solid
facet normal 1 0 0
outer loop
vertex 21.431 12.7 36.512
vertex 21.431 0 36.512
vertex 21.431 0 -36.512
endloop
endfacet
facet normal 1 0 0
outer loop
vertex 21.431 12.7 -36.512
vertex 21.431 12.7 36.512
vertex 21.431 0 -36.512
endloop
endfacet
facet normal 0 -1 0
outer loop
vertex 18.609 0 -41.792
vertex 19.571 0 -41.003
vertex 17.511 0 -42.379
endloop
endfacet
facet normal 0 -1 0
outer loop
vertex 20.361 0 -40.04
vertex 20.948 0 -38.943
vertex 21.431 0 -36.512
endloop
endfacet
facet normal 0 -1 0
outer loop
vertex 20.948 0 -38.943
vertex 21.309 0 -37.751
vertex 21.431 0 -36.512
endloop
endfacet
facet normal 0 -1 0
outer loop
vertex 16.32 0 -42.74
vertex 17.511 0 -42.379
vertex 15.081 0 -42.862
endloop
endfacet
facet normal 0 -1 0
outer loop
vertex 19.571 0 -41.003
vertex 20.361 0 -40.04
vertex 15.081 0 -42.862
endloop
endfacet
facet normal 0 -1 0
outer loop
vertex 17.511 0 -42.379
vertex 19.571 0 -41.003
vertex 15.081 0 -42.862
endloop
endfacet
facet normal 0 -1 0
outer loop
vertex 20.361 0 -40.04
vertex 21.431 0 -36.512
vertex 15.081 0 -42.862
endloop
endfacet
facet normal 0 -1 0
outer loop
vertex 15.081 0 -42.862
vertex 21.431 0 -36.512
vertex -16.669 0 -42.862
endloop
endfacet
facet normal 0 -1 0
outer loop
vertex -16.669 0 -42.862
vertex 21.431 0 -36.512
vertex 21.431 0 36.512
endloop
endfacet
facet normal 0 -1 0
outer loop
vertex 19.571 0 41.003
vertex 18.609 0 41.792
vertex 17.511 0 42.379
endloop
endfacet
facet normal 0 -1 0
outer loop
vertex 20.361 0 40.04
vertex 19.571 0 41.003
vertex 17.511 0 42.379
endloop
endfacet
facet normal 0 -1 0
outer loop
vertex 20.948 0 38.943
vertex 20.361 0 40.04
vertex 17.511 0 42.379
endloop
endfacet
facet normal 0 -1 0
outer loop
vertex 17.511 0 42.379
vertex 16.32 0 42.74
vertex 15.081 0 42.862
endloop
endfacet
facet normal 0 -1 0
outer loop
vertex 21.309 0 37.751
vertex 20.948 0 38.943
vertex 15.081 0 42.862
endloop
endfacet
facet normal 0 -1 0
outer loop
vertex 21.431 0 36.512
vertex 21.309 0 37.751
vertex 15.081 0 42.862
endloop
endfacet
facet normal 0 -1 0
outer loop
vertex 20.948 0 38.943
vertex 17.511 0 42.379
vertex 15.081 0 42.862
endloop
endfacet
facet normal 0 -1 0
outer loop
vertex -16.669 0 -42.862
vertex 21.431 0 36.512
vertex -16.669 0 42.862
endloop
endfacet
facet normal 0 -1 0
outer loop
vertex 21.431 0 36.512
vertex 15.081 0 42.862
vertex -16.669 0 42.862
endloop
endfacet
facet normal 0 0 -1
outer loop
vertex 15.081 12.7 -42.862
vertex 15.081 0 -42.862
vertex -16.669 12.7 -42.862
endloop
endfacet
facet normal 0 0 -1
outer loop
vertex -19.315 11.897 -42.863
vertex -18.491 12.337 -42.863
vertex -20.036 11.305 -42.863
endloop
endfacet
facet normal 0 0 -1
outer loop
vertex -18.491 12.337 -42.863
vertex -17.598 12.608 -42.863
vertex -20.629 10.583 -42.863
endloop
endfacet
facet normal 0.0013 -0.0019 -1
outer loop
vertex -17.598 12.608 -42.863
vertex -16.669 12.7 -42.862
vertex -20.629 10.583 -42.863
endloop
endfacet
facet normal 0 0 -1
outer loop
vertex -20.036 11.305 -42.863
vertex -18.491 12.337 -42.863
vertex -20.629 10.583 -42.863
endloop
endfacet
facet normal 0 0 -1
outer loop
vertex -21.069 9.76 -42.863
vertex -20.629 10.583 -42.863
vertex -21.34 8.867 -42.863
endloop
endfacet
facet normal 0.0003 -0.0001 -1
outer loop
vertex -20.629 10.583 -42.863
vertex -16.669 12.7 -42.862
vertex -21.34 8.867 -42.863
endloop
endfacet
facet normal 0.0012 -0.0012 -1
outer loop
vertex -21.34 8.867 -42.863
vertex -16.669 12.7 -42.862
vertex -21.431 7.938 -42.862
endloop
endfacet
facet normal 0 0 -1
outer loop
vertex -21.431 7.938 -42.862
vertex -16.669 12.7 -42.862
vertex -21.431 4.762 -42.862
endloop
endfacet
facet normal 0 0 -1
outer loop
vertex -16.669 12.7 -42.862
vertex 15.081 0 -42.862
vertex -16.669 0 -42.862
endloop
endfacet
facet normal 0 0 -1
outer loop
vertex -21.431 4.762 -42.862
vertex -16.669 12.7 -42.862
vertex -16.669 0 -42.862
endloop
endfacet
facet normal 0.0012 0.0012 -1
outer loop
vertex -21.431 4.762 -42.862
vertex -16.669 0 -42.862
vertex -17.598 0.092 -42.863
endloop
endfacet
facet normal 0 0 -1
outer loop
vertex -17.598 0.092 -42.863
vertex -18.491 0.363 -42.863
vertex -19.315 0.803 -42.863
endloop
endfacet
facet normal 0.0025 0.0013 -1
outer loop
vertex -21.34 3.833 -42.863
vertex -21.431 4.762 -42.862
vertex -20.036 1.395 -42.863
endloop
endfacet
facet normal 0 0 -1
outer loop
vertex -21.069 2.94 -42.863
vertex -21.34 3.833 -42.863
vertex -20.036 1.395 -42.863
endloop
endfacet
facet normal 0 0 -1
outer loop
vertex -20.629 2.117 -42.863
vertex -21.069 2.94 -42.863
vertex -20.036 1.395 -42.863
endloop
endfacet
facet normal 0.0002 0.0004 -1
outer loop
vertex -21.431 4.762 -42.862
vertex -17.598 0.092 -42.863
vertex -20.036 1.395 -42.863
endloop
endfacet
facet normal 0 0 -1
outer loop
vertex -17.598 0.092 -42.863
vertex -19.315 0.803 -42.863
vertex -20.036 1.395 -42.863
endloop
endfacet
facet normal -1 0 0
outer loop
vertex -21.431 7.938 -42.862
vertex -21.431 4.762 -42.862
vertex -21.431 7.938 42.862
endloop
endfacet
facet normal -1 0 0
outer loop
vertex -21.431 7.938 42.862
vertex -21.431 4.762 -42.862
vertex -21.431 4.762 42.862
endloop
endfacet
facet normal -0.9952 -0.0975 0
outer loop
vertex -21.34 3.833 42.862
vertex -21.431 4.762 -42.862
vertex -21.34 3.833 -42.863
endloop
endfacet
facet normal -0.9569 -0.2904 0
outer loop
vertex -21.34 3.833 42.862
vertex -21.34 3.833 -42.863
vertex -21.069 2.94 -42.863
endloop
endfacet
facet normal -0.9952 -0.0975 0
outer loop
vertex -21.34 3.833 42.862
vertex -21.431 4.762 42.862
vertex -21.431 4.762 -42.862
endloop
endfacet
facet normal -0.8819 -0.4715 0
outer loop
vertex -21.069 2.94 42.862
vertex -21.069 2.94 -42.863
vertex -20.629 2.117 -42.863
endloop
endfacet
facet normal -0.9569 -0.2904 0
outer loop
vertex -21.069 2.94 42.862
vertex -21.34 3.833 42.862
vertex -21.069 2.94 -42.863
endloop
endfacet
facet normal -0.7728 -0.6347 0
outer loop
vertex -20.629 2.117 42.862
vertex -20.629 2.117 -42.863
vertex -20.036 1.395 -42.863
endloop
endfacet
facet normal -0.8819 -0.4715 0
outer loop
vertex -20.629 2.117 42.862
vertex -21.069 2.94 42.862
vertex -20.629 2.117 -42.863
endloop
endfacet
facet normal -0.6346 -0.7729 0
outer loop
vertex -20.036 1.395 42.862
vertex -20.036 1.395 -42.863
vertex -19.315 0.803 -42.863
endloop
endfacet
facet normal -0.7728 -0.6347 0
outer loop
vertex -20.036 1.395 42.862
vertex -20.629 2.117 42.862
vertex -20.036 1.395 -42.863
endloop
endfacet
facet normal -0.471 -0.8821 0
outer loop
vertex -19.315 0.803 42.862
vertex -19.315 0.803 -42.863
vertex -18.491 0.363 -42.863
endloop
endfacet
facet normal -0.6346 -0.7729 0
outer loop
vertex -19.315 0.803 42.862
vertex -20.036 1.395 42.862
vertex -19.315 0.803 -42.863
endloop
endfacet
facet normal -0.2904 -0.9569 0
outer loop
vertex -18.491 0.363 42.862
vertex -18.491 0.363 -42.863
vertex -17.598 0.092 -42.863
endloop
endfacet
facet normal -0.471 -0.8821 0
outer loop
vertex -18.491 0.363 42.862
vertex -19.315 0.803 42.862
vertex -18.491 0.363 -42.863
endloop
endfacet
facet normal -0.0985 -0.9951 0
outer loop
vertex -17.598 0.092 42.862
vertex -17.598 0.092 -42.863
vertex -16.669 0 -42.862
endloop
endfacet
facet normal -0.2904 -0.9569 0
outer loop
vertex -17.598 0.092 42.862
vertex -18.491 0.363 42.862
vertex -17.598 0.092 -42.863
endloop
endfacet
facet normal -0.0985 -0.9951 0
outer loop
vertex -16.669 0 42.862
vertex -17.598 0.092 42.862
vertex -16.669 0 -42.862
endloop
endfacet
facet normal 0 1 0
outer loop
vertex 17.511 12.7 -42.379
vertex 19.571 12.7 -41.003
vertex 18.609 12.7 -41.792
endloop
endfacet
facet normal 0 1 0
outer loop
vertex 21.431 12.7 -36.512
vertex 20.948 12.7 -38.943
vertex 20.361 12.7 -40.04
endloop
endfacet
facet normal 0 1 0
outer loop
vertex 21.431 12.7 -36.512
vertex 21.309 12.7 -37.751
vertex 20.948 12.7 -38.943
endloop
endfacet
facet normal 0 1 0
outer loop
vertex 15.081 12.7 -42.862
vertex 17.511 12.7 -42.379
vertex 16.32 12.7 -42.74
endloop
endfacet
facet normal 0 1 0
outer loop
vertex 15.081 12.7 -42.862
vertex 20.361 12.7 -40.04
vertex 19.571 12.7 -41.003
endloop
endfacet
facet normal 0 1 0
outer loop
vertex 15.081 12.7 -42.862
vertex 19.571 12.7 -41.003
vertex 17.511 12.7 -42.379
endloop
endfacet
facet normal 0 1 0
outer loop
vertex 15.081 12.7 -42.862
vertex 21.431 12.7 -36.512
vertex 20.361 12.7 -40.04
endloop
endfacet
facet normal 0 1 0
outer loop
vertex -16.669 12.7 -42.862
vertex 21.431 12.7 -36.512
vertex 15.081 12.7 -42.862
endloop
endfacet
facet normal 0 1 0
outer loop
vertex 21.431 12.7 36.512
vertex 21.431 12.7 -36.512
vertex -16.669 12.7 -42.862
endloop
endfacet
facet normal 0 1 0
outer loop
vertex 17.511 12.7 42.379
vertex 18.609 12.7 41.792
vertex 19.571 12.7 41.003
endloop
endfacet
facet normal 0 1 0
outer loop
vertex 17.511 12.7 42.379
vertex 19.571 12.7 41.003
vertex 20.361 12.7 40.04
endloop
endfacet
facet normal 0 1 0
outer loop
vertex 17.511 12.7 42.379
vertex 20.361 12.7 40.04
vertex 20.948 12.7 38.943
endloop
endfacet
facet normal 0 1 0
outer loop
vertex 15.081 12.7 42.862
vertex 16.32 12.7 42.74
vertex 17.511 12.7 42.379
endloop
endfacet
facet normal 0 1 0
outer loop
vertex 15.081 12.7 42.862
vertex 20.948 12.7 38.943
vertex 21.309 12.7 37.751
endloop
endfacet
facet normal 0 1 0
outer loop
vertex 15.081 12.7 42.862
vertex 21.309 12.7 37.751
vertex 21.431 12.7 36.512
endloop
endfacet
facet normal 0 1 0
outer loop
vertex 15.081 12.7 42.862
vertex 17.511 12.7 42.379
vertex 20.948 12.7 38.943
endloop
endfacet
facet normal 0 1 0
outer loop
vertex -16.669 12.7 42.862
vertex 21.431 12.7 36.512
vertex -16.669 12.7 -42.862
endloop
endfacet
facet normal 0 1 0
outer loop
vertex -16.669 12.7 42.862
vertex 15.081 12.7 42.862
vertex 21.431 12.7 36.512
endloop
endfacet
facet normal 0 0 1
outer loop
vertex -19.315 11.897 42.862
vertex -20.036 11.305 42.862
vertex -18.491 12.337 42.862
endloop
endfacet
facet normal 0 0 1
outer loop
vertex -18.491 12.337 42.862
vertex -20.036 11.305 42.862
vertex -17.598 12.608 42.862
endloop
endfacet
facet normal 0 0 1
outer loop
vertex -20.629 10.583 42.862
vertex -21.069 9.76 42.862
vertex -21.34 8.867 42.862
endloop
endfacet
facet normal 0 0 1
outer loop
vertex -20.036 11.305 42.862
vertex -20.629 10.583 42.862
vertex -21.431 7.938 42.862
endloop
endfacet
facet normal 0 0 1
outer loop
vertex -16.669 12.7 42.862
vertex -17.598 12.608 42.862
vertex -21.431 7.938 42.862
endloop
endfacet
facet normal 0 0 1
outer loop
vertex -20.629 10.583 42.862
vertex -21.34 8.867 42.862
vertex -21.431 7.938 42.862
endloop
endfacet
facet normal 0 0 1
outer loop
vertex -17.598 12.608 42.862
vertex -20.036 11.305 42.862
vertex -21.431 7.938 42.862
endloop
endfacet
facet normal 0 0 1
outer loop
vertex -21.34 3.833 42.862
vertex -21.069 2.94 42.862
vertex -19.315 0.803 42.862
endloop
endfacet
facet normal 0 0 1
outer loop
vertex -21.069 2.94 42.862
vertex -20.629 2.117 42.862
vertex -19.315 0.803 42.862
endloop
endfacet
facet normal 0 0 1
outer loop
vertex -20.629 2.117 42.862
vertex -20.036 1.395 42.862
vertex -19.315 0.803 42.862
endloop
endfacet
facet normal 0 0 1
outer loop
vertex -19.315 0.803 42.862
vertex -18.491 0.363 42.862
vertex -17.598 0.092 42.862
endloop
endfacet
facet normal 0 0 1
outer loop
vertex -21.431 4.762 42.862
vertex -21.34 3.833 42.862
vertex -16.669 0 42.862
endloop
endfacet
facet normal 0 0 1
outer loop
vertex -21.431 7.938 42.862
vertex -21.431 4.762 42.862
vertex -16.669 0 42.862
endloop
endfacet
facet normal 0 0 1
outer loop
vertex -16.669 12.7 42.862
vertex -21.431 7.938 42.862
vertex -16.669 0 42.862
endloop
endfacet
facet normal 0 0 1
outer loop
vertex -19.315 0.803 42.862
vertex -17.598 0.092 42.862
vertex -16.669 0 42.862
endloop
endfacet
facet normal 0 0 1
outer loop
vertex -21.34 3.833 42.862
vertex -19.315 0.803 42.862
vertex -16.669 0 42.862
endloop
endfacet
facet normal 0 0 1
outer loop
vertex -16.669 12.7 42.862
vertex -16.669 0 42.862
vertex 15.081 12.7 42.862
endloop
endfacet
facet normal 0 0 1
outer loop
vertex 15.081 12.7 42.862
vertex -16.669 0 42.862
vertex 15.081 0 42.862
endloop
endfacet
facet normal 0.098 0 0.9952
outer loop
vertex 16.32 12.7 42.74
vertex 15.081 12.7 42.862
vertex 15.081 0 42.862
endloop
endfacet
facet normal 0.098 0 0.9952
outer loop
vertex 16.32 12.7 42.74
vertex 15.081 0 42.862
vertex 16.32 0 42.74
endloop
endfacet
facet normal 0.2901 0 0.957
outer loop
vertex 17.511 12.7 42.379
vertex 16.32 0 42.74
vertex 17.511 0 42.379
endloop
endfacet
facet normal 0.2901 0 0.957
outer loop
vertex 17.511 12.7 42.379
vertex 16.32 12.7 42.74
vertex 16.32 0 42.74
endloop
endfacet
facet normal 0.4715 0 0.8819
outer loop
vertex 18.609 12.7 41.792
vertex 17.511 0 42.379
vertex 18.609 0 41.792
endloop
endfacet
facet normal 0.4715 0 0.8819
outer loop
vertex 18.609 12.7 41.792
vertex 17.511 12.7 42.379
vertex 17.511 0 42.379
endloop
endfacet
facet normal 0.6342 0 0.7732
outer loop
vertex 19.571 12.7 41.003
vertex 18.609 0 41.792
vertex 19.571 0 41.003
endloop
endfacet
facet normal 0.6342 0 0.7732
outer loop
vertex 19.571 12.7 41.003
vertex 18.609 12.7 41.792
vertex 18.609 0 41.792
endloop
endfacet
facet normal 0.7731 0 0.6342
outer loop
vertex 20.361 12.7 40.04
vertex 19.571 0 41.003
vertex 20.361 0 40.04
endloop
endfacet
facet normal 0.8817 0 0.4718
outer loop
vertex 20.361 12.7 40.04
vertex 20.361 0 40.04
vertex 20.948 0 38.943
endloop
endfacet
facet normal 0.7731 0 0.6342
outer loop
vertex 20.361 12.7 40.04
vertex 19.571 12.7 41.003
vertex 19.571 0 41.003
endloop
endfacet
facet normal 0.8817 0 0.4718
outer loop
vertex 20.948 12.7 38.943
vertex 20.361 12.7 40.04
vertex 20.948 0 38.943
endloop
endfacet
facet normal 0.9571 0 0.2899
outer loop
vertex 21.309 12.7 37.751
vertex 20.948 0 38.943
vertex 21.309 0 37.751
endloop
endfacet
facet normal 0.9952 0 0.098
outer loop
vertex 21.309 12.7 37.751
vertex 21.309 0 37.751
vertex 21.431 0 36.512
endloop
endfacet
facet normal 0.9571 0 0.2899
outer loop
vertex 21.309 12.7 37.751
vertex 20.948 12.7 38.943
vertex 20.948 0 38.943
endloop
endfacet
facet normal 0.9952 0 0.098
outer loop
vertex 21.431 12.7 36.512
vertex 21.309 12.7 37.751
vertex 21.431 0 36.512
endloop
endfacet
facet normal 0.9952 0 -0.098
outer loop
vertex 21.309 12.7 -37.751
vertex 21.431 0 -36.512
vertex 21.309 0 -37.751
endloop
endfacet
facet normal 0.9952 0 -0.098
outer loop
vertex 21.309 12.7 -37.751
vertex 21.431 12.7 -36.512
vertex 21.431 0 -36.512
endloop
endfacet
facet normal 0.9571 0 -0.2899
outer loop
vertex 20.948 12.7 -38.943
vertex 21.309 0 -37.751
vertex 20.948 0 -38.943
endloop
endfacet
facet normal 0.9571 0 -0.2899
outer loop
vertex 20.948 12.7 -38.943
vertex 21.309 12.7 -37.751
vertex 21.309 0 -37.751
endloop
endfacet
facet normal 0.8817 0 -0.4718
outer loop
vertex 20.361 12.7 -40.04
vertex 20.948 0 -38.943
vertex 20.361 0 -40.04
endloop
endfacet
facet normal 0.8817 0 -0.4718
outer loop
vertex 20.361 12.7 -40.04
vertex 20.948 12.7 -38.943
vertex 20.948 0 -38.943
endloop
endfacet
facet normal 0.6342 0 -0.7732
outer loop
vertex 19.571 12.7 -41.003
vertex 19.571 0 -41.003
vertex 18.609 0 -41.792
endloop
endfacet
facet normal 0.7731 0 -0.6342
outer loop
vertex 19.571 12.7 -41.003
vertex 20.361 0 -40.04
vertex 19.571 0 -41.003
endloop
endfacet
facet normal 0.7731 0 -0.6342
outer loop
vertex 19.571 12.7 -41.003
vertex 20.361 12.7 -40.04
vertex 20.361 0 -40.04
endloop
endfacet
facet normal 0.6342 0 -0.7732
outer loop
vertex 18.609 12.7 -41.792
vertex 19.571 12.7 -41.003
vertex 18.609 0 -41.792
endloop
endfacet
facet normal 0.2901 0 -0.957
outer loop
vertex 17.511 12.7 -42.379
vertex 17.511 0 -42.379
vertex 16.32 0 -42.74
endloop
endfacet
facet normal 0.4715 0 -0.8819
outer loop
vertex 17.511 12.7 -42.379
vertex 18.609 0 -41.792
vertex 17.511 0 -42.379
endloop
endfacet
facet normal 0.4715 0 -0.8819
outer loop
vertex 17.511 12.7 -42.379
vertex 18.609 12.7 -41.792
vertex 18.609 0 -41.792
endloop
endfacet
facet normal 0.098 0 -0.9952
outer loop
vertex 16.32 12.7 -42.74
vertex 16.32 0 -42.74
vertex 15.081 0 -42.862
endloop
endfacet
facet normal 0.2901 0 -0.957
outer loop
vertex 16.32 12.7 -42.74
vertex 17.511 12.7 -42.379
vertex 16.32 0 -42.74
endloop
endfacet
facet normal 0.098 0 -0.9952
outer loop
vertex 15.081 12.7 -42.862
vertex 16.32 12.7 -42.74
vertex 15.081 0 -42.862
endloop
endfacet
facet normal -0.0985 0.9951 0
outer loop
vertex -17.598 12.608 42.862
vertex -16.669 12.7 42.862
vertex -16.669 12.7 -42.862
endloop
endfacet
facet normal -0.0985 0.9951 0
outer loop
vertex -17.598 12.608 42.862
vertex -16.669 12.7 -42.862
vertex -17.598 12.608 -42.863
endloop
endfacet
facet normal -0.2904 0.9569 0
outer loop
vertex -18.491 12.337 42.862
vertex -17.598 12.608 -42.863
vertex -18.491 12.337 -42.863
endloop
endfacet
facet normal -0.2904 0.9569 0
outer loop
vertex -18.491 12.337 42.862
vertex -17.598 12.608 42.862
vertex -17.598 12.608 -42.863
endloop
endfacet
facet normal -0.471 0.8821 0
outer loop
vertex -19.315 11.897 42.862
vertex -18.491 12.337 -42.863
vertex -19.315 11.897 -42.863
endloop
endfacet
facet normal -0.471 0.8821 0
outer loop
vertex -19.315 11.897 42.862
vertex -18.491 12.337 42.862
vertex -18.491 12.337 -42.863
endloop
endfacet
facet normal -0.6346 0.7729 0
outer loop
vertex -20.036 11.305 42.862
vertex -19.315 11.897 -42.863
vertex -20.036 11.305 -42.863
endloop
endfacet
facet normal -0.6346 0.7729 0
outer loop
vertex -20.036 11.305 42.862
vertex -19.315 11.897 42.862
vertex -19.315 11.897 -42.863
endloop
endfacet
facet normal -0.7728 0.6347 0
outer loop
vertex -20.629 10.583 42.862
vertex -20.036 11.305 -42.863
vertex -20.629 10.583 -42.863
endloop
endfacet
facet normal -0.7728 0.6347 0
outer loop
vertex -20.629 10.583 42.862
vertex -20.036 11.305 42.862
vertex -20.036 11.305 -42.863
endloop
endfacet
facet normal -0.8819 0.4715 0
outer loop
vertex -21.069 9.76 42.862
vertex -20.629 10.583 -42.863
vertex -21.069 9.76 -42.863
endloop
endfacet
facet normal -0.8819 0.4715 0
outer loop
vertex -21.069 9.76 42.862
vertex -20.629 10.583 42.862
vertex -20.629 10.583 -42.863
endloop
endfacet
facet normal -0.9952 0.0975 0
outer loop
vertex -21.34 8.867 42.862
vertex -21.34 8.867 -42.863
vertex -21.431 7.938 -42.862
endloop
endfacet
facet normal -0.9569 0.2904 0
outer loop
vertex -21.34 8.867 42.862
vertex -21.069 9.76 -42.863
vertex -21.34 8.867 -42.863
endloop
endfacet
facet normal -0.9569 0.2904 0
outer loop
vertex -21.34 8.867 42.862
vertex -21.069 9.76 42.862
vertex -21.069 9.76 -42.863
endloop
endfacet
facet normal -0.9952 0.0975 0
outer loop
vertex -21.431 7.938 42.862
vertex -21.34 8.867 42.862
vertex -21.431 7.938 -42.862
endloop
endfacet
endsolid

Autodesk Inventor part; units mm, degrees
ref_plane "YZ Plane" through (0, 0, 0) normal (1, 0, 0) x (0, 1, 0)
ref_plane "XZ Plane" through (0, 0, 0) normal (0, 1, 0) x (-1, 0, 0)
ref_plane "XY Plane" through (0, 0, 0) normal (0, 0, 1) x (1, 0, 0)
sketch "Sketch1" plane through (0, 0, 0) normal (0, 1, 0) x (-1, 0, 0)
  line L0 (21.4313, 42.8625) -> (-21.4313, 42.8625)
  line L1 (-21.4313, 42.8625) -> (-21.4313, -42.8625)
  line L2 (-21.4313, -42.8625) -> (21.4312, -42.8625)
  line L3 (21.4312, -42.8625) -> (21.4313, 42.8625)
  line L4 (0, -60.0075) -> (0, 60.0075) construction
  line L5 (30.0038, 0) -> (-30.0038, 0) construction
  point P0 (0, 0)
  point P1 (0, -42.8625)
  point P2 (-21.4313, 0)
  dimension "d0" = 85.725
  dimension "d1" = 42.8625
extrude "Extrusion1" add sketch "Sketch1" along normal blind 12.7
fillet "Fillet1" radius 4.7625 2 edges at (-21.4312, 12.7, 0) (-21.4312, 0, 0)
fillet "Fillet2" radius 6.35 2 edges at (21.4313, 6.35, 42.8625) (21.4313, 6.35, -42.8625)
properties part number "Onn-USB-Hub"
